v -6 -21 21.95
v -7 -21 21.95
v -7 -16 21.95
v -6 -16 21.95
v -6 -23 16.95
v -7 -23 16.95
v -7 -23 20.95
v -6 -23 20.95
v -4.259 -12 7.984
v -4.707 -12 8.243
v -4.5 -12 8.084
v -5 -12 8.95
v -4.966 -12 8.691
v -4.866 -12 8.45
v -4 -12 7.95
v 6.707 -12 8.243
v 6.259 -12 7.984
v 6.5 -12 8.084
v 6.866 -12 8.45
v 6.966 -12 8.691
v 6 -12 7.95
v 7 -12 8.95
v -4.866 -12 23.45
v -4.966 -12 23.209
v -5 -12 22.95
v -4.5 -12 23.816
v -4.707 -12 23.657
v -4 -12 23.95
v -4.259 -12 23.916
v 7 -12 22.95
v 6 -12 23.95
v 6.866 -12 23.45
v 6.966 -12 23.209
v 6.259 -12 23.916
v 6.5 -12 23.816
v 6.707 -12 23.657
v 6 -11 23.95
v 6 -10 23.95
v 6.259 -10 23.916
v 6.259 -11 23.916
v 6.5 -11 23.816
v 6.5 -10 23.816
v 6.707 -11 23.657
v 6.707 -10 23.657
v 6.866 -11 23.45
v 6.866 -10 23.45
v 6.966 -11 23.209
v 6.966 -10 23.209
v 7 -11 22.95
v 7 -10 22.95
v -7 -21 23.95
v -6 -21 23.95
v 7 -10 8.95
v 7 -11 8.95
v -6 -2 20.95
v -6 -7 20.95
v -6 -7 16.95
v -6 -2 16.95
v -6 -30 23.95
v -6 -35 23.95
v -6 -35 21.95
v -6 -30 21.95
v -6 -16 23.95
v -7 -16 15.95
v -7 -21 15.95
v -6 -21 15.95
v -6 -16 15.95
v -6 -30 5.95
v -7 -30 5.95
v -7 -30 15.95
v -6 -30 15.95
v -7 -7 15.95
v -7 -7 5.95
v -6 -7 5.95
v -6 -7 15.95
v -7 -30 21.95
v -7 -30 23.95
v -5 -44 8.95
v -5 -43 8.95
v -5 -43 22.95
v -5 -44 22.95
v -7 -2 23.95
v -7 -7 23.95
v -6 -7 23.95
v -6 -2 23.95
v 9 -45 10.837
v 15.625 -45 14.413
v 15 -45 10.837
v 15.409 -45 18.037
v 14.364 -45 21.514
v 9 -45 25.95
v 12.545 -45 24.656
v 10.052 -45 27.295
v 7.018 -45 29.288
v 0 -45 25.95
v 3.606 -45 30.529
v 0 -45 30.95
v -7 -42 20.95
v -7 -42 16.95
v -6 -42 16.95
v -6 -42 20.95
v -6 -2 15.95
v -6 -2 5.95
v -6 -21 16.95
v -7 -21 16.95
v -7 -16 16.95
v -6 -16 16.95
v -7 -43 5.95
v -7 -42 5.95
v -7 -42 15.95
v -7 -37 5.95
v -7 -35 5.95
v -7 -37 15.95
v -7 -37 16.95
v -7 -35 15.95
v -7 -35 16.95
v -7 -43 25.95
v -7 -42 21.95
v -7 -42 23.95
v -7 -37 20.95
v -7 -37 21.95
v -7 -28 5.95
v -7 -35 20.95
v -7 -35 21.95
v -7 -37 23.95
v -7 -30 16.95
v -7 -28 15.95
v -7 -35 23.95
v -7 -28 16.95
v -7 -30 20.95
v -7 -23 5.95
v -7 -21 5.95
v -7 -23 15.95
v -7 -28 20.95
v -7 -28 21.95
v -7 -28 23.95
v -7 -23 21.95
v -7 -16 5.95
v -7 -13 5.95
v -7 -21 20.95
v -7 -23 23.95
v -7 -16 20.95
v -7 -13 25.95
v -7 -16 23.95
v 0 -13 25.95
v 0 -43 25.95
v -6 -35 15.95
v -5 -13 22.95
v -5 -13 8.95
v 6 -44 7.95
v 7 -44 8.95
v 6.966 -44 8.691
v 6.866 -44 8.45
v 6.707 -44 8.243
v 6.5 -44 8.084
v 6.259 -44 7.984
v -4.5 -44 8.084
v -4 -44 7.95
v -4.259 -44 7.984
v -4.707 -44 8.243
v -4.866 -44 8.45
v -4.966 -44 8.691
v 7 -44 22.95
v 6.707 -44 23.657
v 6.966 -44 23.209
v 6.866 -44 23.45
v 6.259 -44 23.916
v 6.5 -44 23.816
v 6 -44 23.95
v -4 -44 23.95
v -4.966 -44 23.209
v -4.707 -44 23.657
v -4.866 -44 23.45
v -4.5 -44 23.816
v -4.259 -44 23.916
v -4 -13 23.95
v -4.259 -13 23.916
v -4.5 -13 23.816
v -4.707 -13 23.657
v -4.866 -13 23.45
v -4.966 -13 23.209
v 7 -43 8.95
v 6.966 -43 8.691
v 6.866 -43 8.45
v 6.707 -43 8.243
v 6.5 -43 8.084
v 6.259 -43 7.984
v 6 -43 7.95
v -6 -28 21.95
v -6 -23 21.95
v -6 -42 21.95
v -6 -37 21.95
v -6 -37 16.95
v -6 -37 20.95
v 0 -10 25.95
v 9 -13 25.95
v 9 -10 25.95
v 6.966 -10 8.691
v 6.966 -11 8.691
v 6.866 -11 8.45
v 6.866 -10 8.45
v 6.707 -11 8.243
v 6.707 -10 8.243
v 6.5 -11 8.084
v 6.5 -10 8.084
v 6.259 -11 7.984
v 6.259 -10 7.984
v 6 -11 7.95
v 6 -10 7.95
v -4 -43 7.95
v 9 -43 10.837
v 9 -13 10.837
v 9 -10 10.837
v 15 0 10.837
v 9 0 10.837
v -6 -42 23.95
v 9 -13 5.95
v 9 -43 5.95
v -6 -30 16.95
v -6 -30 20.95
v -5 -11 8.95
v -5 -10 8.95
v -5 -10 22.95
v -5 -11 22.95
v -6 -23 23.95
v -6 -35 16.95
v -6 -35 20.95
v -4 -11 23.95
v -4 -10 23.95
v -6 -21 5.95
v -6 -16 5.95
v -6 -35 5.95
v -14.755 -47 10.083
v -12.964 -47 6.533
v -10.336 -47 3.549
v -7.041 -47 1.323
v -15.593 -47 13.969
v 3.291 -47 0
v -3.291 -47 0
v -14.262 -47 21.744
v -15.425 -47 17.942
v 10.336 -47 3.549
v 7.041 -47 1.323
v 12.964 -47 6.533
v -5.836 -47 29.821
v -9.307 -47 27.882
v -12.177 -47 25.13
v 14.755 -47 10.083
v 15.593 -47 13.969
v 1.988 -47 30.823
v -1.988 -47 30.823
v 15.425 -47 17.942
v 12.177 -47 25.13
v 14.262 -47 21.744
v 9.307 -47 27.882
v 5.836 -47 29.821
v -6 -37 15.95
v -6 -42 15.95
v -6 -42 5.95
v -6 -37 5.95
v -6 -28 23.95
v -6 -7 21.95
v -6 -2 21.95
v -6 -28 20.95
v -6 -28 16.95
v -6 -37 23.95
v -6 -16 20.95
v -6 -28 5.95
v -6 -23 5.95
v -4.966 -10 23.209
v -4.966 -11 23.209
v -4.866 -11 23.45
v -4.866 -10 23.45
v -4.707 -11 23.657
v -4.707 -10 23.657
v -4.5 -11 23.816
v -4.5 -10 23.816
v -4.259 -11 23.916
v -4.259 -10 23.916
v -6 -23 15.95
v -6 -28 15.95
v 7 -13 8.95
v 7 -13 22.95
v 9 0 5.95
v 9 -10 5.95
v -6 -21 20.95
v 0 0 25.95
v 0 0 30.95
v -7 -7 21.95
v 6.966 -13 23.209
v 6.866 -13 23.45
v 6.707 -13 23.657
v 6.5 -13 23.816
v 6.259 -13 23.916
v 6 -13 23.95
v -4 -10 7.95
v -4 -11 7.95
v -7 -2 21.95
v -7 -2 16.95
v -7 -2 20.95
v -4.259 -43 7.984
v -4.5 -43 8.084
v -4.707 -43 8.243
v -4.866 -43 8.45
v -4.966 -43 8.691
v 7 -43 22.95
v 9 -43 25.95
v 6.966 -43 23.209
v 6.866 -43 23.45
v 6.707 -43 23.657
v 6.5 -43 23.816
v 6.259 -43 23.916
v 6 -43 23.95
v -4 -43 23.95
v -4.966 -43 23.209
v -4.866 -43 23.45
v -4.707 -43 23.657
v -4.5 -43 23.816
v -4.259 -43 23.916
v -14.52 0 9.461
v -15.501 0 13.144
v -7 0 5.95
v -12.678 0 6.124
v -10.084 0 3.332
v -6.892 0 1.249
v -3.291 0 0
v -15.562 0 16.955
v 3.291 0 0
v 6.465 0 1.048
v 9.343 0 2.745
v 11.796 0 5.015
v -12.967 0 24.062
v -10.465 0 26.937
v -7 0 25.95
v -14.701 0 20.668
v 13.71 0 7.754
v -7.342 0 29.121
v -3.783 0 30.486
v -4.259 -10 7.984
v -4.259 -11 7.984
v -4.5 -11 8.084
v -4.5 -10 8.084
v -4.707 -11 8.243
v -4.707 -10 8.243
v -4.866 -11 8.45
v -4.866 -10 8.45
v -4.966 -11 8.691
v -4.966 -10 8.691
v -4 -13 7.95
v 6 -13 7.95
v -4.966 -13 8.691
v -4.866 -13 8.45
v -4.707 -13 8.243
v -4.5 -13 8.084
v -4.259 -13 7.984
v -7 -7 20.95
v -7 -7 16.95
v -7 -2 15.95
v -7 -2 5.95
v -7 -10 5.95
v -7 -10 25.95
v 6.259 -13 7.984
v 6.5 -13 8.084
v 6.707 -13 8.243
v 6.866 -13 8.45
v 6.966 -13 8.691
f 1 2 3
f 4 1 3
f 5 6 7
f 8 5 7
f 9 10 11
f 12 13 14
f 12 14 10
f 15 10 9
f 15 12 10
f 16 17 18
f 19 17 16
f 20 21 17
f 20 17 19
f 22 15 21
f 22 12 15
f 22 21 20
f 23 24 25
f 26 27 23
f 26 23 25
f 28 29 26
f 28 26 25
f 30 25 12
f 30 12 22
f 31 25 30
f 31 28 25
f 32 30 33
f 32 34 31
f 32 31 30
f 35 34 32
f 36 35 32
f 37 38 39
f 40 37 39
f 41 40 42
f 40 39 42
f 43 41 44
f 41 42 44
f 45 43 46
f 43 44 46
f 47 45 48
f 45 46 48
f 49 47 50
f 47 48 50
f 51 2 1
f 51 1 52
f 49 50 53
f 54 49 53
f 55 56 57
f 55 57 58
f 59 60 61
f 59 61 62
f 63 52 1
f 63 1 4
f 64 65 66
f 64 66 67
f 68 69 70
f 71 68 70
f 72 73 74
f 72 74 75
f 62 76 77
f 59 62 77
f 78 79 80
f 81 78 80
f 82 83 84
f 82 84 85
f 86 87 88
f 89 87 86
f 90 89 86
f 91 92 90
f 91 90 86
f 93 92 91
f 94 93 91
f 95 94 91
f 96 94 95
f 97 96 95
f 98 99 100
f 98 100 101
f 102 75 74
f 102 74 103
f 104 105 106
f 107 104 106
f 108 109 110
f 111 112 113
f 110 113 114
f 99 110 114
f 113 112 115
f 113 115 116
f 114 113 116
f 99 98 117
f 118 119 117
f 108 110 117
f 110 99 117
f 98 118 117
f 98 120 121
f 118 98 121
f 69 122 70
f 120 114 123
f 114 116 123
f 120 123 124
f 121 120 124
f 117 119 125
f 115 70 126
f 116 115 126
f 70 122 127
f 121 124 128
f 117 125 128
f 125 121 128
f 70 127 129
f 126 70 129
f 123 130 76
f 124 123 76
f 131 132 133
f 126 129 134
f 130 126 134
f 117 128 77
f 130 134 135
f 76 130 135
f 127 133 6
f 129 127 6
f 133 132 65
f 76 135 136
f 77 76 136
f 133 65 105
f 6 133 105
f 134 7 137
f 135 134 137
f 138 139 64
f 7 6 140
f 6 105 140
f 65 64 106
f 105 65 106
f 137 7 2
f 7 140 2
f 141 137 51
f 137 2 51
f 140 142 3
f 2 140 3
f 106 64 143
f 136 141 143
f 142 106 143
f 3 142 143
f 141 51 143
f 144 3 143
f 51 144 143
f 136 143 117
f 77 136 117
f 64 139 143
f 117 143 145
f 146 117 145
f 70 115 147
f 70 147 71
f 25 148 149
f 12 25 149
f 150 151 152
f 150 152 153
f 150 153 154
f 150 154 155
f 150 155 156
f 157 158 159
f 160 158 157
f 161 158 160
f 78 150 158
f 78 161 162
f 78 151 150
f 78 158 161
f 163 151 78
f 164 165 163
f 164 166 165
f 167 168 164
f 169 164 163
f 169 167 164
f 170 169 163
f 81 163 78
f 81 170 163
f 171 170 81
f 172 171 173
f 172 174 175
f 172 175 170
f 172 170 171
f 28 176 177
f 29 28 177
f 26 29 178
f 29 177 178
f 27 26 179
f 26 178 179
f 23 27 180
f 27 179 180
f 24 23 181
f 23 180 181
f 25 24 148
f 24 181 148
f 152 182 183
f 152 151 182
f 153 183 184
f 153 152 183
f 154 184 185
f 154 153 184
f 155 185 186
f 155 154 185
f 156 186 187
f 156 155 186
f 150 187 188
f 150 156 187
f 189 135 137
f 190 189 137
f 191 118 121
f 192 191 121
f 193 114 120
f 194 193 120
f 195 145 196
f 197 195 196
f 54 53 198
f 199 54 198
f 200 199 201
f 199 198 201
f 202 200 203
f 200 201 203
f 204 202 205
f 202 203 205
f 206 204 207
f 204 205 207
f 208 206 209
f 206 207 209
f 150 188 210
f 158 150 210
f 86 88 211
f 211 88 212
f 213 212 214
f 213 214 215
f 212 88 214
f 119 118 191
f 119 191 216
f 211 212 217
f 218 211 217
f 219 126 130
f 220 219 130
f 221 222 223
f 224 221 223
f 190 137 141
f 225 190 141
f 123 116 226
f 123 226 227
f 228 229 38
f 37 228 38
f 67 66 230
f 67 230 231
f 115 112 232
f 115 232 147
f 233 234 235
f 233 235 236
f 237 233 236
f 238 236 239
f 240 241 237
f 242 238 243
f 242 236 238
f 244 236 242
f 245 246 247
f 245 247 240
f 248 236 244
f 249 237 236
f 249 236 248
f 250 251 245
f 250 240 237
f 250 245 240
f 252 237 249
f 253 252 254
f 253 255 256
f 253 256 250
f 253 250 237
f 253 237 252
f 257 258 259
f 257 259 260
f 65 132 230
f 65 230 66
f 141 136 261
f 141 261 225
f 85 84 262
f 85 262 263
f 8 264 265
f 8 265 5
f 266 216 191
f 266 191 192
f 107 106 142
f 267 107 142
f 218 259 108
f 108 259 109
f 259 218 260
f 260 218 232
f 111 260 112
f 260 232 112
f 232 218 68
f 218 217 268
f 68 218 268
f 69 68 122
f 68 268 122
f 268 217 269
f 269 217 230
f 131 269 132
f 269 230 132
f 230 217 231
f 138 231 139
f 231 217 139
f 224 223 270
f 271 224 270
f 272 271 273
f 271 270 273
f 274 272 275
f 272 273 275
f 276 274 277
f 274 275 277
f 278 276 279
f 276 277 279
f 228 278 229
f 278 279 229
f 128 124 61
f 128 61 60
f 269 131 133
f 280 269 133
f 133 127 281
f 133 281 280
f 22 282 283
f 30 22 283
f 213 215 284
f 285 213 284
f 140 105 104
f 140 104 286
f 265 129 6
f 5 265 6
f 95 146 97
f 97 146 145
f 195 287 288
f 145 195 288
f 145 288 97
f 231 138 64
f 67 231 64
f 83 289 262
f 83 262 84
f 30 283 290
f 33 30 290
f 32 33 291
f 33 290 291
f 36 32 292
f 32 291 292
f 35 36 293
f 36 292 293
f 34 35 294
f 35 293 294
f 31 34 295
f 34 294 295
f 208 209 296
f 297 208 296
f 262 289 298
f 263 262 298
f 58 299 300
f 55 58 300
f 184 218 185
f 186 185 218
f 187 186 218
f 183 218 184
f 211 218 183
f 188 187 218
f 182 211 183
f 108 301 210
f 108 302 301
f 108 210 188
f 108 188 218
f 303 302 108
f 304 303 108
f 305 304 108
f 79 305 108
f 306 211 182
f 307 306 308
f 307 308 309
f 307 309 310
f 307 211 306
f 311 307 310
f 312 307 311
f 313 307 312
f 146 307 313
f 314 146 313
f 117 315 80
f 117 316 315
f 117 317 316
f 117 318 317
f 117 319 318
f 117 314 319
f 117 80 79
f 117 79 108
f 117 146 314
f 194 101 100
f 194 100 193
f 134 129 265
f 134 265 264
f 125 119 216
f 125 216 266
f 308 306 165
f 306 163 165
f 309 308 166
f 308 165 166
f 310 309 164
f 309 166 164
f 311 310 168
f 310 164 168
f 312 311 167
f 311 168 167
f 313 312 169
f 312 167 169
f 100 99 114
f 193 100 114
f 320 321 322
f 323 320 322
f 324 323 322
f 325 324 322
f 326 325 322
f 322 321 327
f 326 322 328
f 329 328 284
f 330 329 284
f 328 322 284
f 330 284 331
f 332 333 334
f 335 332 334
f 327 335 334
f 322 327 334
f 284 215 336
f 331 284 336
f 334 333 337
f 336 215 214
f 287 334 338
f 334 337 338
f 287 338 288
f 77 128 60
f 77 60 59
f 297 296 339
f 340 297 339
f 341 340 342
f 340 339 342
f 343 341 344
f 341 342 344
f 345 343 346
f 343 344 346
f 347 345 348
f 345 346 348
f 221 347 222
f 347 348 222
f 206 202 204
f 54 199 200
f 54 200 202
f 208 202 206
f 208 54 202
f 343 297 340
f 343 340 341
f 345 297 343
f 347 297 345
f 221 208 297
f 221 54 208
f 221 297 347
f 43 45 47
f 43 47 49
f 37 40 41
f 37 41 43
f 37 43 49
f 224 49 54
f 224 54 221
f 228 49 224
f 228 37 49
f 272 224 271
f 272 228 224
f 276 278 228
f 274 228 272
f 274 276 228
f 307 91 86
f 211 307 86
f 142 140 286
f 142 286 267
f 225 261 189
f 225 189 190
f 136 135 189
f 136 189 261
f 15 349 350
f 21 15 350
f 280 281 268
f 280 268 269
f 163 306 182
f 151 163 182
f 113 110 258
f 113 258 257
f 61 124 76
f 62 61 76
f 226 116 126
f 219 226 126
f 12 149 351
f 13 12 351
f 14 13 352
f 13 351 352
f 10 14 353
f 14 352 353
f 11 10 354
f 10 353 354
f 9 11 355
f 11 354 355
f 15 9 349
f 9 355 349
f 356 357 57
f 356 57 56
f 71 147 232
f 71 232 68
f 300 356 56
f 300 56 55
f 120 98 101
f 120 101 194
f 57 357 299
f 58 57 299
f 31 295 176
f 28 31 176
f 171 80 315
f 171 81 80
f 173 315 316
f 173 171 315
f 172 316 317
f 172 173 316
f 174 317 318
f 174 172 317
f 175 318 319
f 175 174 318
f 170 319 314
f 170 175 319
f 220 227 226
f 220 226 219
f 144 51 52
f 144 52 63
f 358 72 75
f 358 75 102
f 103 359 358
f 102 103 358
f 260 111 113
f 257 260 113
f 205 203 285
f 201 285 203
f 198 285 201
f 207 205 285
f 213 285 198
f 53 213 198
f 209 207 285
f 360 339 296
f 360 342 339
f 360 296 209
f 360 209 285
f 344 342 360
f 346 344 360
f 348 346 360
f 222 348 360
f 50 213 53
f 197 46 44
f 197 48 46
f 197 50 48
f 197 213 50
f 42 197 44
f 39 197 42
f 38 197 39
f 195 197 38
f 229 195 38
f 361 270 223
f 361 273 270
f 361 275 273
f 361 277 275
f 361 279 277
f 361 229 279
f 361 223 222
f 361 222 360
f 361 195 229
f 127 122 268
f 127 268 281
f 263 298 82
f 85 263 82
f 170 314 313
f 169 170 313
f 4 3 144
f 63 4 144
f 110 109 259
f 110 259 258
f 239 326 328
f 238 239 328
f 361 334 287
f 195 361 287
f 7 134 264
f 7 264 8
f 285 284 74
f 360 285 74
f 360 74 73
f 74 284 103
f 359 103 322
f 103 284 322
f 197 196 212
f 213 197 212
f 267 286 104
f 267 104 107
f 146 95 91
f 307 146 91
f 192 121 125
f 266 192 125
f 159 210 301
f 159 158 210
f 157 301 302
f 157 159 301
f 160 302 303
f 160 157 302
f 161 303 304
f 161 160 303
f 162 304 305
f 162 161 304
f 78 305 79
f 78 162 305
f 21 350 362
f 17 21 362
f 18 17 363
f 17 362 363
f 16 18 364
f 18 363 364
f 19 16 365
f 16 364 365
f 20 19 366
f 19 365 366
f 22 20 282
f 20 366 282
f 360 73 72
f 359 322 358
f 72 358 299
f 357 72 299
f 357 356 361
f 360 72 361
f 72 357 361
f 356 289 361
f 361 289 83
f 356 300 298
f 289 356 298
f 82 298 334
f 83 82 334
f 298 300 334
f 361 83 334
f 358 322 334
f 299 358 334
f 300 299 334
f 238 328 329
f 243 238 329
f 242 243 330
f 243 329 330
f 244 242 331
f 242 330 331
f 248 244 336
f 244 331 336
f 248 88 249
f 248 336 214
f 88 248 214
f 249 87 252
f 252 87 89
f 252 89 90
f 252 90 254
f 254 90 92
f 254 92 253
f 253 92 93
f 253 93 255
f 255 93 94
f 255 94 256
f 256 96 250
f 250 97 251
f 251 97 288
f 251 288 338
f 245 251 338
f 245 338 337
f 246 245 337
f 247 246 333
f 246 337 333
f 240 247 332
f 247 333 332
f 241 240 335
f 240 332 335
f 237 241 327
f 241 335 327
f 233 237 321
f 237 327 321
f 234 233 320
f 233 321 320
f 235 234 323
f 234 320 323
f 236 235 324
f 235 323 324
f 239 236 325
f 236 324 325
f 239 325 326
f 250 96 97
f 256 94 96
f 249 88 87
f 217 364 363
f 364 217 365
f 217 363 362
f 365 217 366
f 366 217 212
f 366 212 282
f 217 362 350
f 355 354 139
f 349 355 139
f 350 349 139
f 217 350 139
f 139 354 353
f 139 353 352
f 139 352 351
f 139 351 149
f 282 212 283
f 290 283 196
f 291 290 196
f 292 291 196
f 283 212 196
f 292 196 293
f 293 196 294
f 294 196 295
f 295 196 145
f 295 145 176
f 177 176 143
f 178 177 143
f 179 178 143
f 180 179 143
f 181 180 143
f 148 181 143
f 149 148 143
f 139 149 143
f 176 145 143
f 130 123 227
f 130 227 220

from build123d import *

# Parameters (mm, degrees)
F1_DEPTH  = 47
F3_DEPTH  = 45
F5_DEPTH  = 2
F7_DEPTH  = 1
F8_R      = 1
F9_W      = 5
F9_H      = 10
F9_H_2    = 4
F9_H_3    = 2
F10_DEPTH = 1
F13_DEPTH = 3
F15_DEPTH = 1
F17_DEPTH = 1


with BuildPart() as f1:
    # F0 (on Front) → F1 (new body)
    with BuildSketch(Plane.XZ):
        with BuildLine():
            Line((-3.2912763482, 0), (3.2912763482, 0))
            ThreePointArc((3.2912763482, 0), (0, 30.95), (-3.2912763482, 0))
        make_face()
    extrude(amount=F1_DEPTH)

    # F2 (on face) → F3 (cut)
    with BuildSketch(Plane(origin=(0, 0, 0), x_dir=(-1, 0, 0), z_dir=(0, 1, 0))):
        with BuildLine():
            Line((0, 25.95), (0, 30.95))
            ThreePointArc((0, 30.95), (-12.5454312905, 24.6559956037), (-15, 10.8365372187))
            Line((-15, 10.8365372187), (-9, 10.8365372187))
            Line((-9, 10.8365372187), (-9, 5.95))
            Line((-9, 5.95), (7, 5.95))
            Line((7, 5.95), (7, 25.95))
            Line((7, 25.95), (0, 25.95))
        make_face()
    extrude(amount=-F3_DEPTH, mode=Mode.SUBTRACT)

    # F4 (on face) → F5 (join)
    with BuildSketch(Plane(origin=(0, -45, 0), x_dir=(-1, 0, 0), z_dir=(0, 1, 0))):
        Polygon((-9, 25.95), (-9, 10.8365372187), (-9, 5.95), (7, 5.95), (7, 25.95), (0, 25.95), align=None)
    extrude(amount=F5_DEPTH)

    # F6 (on face) → F7 (cut)
    with BuildSketch(Plane(origin=(0, -43, 0), x_dir=(-1, 0, 0), z_dir=(0, 1, 0))):
        Polygon((0, 23.95), (-7, 23.95), (-7, 7.95), (5, 7.95), (5, 23.95), align=None)
    extrude(amount=-F7_DEPTH, mode=Mode.SUBTRACT)

    # F8
    f8_edges = [f1.edges().sort_by_distance(p)[0] for p in [
        (7, -43.5, 23.95),
        (-5, -43.5, 23.95),
        (7, -43.5, 7.95),
        (-5, -43.5, 7.95),
    ]]
    fillet(f8_edges, radius=F8_R)

    # F9 (on face) → F10 (join)
    with BuildSketch(Plane.YZ.offset(-7)):
        with Locations((-39.5, 10.95)):
            Rectangle(F9_W, F9_H)
        with Locations((-39.5, 18.95)):
            Rectangle(F9_W, F9_H_2)
        with Locations((-39.5, 22.95)):
            Rectangle(F9_W, F9_H_3)
        with Locations((-32.5, 22.95)):
            Rectangle(F9_W, F9_H_3)
        with Locations((-32.5, 18.95)):
            Rectangle(F9_W, F9_H_2)
        with Locations((-32.5, 10.95)):
            Rectangle(F9_W, F9_H)
        with Locations((-25.5, 22.95)):
            Rectangle(F9_W, F9_H_3)
        with Locations((-25.5, 18.95)):
            Rectangle(F9_W, F9_H_2)
        with Locations((-25.5, 10.95)):
            Rectangle(F9_W, F9_H)
        with Locations((-18.5, 22.95)):
            Rectangle(F9_W, F9_H_3)
        with Locations((-18.5, 18.95)):
            Rectangle(F9_W, F9_H_2)
        with Locations((-18.5, 10.95)):
            Rectangle(F9_W, F9_H)
        with Locations((-4.5, 22.95)):
            Rectangle(F9_W, F9_H_3)
        with Locations((-4.5, 18.95)):
            Rectangle(F9_W, F9_H_2)
        with Locations((-4.5, 10.95)):
            Rectangle(F9_W, F9_H)
    extrude(amount=F10_DEPTH)

    # F12 (on offset) → F13 (join)
    with BuildSketch(Plane(origin=(0, -13, 0), x_dir=(-1, 0, 0), z_dir=(0, 1, 0))):
        Polygon((7, 25.95), (0, 25.95), (-9, 25.95), (-9, 10.8365372187), (-9, 5.95), (7, 5.95), align=None)
    extrude(amount=F13_DEPTH)

    # F14 (on face) → F15 (cut)
    with BuildSketch(Plane(origin=(0, -10, 0), x_dir=(-1, 0, 0), z_dir=(0, 1, 0))):
        with BuildLine():
            ThreePointArc((4, 7.95), (4.7071067812, 8.2428932188), (5, 8.95))
            Line((5, 8.95), (5, 22.95))
            ThreePointArc((5, 22.95), (4.7071067812, 23.6571067812), (4, 23.95))
            Line((4, 23.95), (-6, 23.95))
            ThreePointArc((-6, 23.95), (-6.7071067812, 23.6571067812), (-7, 22.95))
            Line((-7, 22.95), (-7, 8.95))
            ThreePointArc((-7, 8.95), (-6.7071067812, 8.2428932188), (-6, 7.95))
            Line((-6, 7.95), (4, 7.95))
        make_face()
    extrude(amount=-F15_DEPTH, mode=Mode.SUBTRACT)

    # F16 (on face) → F17 (cut)
    with BuildSketch(Plane.XZ.offset(13)):
        with BuildLine():
            Line((-4, 7.95), (6, 7.95))
            ThreePointArc((6, 7.95), (6.7071067812, 8.2428932188), (7, 8.95))
            Line((7, 8.95), (7, 22.95))
            ThreePointArc((7, 22.95), (6.7071067812, 23.6571067812), (6, 23.95))
            Line((6, 23.95), (-4, 23.95))
            ThreePointArc((-4, 23.95), (-4.7071067812, 23.6571067812), (-5, 22.95))
            Line((-5, 22.95), (-5, 8.95))
            ThreePointArc((-5, 8.95), (-4.7071067812, 8.2428932188), (-4, 7.95))
        make_face()
    extrude(amount=-F17_DEPTH, mode=Mode.SUBTRACT)


solid = f1.part
